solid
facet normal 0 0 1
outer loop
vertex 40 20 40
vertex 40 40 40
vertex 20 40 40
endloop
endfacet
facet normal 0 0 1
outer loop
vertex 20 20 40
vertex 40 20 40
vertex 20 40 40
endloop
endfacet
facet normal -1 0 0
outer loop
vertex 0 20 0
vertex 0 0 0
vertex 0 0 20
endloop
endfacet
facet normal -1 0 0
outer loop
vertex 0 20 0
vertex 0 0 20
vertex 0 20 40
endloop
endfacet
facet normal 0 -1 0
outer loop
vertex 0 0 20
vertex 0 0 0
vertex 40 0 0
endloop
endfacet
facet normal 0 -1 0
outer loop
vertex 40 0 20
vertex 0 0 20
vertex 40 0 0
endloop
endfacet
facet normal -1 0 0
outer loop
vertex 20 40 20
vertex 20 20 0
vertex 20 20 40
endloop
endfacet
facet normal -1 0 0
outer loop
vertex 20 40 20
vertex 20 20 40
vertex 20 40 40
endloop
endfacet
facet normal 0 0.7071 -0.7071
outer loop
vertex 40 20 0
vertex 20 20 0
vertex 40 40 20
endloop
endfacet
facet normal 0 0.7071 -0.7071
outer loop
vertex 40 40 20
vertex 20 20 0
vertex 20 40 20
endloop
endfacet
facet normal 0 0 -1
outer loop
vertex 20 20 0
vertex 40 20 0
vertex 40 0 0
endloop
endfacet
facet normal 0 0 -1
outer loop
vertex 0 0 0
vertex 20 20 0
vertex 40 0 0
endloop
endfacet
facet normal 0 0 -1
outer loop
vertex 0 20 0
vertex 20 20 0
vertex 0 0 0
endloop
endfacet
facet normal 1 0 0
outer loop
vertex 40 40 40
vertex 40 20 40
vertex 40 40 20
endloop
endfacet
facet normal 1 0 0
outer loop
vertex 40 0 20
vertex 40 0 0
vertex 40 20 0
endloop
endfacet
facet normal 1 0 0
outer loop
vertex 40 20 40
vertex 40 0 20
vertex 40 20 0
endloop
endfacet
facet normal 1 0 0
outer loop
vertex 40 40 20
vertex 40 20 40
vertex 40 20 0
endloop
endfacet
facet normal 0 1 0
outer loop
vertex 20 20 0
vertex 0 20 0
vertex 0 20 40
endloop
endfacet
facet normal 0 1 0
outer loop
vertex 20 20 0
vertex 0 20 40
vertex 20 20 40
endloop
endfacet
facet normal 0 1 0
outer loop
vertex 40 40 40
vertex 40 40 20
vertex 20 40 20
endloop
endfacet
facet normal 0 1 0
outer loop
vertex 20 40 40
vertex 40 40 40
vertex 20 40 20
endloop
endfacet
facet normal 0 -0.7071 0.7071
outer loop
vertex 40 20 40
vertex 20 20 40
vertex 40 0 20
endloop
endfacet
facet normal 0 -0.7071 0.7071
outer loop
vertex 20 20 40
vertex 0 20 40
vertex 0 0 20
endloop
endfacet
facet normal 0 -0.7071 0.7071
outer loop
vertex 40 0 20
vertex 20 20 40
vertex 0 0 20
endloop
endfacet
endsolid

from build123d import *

# Parameters (mm, degrees)
SKETCH1_W           = 40
SKETCH1_H           = 20
BOSS_EXTRUDE1_DEPTH = 40
CUT_EXTRUDE1_DEPTH  = 40
SKETCH4_W           = 20
SKETCH4_H           = 20
BOSS_EXTRUDE3_DEPTH = 40
CUT_EXTRUDE2_DEPTH  = 40


with BuildPart() as part:
    # Sketch1 → Boss-Extrude1 (new body)
    with BuildSketch(Plane.XY):
        with Locations((20, 10)):
            Rectangle(SKETCH1_W, SKETCH1_H)
    extrude(amount=BOSS_EXTRUDE1_DEPTH)

    # Sketch2 → Cut-Extrude1 (cut)
    with BuildSketch(Plane.ZY):
        Polygon((40, 20), (20, 0), (40, 0), align=None)
    extrude(amount=-CUT_EXTRUDE1_DEPTH, mode=Mode.SUBTRACT)

    # Sketch4 → Boss-Extrude3 (add)
    with BuildSketch(Plane(origin=(0, 0, 0), x_dir=(-1, 0, 0), z_dir=(0, 0, -1))):
        with Locations((-30, 30)):
            Rectangle(SKETCH4_W, SKETCH4_H)
    extrude(amount=-BOSS_EXTRUDE3_DEPTH)

    # Sketch5 → Cut-Extrude2 (cut)
    with BuildSketch(Plane.ZY.offset(-20)):
        Polygon((0, 20), (20, 40), (0, 40), align=None)
    extrude(amount=-CUT_EXTRUDE2_DEPTH, mode=Mode.SUBTRACT)


solid = part.part
